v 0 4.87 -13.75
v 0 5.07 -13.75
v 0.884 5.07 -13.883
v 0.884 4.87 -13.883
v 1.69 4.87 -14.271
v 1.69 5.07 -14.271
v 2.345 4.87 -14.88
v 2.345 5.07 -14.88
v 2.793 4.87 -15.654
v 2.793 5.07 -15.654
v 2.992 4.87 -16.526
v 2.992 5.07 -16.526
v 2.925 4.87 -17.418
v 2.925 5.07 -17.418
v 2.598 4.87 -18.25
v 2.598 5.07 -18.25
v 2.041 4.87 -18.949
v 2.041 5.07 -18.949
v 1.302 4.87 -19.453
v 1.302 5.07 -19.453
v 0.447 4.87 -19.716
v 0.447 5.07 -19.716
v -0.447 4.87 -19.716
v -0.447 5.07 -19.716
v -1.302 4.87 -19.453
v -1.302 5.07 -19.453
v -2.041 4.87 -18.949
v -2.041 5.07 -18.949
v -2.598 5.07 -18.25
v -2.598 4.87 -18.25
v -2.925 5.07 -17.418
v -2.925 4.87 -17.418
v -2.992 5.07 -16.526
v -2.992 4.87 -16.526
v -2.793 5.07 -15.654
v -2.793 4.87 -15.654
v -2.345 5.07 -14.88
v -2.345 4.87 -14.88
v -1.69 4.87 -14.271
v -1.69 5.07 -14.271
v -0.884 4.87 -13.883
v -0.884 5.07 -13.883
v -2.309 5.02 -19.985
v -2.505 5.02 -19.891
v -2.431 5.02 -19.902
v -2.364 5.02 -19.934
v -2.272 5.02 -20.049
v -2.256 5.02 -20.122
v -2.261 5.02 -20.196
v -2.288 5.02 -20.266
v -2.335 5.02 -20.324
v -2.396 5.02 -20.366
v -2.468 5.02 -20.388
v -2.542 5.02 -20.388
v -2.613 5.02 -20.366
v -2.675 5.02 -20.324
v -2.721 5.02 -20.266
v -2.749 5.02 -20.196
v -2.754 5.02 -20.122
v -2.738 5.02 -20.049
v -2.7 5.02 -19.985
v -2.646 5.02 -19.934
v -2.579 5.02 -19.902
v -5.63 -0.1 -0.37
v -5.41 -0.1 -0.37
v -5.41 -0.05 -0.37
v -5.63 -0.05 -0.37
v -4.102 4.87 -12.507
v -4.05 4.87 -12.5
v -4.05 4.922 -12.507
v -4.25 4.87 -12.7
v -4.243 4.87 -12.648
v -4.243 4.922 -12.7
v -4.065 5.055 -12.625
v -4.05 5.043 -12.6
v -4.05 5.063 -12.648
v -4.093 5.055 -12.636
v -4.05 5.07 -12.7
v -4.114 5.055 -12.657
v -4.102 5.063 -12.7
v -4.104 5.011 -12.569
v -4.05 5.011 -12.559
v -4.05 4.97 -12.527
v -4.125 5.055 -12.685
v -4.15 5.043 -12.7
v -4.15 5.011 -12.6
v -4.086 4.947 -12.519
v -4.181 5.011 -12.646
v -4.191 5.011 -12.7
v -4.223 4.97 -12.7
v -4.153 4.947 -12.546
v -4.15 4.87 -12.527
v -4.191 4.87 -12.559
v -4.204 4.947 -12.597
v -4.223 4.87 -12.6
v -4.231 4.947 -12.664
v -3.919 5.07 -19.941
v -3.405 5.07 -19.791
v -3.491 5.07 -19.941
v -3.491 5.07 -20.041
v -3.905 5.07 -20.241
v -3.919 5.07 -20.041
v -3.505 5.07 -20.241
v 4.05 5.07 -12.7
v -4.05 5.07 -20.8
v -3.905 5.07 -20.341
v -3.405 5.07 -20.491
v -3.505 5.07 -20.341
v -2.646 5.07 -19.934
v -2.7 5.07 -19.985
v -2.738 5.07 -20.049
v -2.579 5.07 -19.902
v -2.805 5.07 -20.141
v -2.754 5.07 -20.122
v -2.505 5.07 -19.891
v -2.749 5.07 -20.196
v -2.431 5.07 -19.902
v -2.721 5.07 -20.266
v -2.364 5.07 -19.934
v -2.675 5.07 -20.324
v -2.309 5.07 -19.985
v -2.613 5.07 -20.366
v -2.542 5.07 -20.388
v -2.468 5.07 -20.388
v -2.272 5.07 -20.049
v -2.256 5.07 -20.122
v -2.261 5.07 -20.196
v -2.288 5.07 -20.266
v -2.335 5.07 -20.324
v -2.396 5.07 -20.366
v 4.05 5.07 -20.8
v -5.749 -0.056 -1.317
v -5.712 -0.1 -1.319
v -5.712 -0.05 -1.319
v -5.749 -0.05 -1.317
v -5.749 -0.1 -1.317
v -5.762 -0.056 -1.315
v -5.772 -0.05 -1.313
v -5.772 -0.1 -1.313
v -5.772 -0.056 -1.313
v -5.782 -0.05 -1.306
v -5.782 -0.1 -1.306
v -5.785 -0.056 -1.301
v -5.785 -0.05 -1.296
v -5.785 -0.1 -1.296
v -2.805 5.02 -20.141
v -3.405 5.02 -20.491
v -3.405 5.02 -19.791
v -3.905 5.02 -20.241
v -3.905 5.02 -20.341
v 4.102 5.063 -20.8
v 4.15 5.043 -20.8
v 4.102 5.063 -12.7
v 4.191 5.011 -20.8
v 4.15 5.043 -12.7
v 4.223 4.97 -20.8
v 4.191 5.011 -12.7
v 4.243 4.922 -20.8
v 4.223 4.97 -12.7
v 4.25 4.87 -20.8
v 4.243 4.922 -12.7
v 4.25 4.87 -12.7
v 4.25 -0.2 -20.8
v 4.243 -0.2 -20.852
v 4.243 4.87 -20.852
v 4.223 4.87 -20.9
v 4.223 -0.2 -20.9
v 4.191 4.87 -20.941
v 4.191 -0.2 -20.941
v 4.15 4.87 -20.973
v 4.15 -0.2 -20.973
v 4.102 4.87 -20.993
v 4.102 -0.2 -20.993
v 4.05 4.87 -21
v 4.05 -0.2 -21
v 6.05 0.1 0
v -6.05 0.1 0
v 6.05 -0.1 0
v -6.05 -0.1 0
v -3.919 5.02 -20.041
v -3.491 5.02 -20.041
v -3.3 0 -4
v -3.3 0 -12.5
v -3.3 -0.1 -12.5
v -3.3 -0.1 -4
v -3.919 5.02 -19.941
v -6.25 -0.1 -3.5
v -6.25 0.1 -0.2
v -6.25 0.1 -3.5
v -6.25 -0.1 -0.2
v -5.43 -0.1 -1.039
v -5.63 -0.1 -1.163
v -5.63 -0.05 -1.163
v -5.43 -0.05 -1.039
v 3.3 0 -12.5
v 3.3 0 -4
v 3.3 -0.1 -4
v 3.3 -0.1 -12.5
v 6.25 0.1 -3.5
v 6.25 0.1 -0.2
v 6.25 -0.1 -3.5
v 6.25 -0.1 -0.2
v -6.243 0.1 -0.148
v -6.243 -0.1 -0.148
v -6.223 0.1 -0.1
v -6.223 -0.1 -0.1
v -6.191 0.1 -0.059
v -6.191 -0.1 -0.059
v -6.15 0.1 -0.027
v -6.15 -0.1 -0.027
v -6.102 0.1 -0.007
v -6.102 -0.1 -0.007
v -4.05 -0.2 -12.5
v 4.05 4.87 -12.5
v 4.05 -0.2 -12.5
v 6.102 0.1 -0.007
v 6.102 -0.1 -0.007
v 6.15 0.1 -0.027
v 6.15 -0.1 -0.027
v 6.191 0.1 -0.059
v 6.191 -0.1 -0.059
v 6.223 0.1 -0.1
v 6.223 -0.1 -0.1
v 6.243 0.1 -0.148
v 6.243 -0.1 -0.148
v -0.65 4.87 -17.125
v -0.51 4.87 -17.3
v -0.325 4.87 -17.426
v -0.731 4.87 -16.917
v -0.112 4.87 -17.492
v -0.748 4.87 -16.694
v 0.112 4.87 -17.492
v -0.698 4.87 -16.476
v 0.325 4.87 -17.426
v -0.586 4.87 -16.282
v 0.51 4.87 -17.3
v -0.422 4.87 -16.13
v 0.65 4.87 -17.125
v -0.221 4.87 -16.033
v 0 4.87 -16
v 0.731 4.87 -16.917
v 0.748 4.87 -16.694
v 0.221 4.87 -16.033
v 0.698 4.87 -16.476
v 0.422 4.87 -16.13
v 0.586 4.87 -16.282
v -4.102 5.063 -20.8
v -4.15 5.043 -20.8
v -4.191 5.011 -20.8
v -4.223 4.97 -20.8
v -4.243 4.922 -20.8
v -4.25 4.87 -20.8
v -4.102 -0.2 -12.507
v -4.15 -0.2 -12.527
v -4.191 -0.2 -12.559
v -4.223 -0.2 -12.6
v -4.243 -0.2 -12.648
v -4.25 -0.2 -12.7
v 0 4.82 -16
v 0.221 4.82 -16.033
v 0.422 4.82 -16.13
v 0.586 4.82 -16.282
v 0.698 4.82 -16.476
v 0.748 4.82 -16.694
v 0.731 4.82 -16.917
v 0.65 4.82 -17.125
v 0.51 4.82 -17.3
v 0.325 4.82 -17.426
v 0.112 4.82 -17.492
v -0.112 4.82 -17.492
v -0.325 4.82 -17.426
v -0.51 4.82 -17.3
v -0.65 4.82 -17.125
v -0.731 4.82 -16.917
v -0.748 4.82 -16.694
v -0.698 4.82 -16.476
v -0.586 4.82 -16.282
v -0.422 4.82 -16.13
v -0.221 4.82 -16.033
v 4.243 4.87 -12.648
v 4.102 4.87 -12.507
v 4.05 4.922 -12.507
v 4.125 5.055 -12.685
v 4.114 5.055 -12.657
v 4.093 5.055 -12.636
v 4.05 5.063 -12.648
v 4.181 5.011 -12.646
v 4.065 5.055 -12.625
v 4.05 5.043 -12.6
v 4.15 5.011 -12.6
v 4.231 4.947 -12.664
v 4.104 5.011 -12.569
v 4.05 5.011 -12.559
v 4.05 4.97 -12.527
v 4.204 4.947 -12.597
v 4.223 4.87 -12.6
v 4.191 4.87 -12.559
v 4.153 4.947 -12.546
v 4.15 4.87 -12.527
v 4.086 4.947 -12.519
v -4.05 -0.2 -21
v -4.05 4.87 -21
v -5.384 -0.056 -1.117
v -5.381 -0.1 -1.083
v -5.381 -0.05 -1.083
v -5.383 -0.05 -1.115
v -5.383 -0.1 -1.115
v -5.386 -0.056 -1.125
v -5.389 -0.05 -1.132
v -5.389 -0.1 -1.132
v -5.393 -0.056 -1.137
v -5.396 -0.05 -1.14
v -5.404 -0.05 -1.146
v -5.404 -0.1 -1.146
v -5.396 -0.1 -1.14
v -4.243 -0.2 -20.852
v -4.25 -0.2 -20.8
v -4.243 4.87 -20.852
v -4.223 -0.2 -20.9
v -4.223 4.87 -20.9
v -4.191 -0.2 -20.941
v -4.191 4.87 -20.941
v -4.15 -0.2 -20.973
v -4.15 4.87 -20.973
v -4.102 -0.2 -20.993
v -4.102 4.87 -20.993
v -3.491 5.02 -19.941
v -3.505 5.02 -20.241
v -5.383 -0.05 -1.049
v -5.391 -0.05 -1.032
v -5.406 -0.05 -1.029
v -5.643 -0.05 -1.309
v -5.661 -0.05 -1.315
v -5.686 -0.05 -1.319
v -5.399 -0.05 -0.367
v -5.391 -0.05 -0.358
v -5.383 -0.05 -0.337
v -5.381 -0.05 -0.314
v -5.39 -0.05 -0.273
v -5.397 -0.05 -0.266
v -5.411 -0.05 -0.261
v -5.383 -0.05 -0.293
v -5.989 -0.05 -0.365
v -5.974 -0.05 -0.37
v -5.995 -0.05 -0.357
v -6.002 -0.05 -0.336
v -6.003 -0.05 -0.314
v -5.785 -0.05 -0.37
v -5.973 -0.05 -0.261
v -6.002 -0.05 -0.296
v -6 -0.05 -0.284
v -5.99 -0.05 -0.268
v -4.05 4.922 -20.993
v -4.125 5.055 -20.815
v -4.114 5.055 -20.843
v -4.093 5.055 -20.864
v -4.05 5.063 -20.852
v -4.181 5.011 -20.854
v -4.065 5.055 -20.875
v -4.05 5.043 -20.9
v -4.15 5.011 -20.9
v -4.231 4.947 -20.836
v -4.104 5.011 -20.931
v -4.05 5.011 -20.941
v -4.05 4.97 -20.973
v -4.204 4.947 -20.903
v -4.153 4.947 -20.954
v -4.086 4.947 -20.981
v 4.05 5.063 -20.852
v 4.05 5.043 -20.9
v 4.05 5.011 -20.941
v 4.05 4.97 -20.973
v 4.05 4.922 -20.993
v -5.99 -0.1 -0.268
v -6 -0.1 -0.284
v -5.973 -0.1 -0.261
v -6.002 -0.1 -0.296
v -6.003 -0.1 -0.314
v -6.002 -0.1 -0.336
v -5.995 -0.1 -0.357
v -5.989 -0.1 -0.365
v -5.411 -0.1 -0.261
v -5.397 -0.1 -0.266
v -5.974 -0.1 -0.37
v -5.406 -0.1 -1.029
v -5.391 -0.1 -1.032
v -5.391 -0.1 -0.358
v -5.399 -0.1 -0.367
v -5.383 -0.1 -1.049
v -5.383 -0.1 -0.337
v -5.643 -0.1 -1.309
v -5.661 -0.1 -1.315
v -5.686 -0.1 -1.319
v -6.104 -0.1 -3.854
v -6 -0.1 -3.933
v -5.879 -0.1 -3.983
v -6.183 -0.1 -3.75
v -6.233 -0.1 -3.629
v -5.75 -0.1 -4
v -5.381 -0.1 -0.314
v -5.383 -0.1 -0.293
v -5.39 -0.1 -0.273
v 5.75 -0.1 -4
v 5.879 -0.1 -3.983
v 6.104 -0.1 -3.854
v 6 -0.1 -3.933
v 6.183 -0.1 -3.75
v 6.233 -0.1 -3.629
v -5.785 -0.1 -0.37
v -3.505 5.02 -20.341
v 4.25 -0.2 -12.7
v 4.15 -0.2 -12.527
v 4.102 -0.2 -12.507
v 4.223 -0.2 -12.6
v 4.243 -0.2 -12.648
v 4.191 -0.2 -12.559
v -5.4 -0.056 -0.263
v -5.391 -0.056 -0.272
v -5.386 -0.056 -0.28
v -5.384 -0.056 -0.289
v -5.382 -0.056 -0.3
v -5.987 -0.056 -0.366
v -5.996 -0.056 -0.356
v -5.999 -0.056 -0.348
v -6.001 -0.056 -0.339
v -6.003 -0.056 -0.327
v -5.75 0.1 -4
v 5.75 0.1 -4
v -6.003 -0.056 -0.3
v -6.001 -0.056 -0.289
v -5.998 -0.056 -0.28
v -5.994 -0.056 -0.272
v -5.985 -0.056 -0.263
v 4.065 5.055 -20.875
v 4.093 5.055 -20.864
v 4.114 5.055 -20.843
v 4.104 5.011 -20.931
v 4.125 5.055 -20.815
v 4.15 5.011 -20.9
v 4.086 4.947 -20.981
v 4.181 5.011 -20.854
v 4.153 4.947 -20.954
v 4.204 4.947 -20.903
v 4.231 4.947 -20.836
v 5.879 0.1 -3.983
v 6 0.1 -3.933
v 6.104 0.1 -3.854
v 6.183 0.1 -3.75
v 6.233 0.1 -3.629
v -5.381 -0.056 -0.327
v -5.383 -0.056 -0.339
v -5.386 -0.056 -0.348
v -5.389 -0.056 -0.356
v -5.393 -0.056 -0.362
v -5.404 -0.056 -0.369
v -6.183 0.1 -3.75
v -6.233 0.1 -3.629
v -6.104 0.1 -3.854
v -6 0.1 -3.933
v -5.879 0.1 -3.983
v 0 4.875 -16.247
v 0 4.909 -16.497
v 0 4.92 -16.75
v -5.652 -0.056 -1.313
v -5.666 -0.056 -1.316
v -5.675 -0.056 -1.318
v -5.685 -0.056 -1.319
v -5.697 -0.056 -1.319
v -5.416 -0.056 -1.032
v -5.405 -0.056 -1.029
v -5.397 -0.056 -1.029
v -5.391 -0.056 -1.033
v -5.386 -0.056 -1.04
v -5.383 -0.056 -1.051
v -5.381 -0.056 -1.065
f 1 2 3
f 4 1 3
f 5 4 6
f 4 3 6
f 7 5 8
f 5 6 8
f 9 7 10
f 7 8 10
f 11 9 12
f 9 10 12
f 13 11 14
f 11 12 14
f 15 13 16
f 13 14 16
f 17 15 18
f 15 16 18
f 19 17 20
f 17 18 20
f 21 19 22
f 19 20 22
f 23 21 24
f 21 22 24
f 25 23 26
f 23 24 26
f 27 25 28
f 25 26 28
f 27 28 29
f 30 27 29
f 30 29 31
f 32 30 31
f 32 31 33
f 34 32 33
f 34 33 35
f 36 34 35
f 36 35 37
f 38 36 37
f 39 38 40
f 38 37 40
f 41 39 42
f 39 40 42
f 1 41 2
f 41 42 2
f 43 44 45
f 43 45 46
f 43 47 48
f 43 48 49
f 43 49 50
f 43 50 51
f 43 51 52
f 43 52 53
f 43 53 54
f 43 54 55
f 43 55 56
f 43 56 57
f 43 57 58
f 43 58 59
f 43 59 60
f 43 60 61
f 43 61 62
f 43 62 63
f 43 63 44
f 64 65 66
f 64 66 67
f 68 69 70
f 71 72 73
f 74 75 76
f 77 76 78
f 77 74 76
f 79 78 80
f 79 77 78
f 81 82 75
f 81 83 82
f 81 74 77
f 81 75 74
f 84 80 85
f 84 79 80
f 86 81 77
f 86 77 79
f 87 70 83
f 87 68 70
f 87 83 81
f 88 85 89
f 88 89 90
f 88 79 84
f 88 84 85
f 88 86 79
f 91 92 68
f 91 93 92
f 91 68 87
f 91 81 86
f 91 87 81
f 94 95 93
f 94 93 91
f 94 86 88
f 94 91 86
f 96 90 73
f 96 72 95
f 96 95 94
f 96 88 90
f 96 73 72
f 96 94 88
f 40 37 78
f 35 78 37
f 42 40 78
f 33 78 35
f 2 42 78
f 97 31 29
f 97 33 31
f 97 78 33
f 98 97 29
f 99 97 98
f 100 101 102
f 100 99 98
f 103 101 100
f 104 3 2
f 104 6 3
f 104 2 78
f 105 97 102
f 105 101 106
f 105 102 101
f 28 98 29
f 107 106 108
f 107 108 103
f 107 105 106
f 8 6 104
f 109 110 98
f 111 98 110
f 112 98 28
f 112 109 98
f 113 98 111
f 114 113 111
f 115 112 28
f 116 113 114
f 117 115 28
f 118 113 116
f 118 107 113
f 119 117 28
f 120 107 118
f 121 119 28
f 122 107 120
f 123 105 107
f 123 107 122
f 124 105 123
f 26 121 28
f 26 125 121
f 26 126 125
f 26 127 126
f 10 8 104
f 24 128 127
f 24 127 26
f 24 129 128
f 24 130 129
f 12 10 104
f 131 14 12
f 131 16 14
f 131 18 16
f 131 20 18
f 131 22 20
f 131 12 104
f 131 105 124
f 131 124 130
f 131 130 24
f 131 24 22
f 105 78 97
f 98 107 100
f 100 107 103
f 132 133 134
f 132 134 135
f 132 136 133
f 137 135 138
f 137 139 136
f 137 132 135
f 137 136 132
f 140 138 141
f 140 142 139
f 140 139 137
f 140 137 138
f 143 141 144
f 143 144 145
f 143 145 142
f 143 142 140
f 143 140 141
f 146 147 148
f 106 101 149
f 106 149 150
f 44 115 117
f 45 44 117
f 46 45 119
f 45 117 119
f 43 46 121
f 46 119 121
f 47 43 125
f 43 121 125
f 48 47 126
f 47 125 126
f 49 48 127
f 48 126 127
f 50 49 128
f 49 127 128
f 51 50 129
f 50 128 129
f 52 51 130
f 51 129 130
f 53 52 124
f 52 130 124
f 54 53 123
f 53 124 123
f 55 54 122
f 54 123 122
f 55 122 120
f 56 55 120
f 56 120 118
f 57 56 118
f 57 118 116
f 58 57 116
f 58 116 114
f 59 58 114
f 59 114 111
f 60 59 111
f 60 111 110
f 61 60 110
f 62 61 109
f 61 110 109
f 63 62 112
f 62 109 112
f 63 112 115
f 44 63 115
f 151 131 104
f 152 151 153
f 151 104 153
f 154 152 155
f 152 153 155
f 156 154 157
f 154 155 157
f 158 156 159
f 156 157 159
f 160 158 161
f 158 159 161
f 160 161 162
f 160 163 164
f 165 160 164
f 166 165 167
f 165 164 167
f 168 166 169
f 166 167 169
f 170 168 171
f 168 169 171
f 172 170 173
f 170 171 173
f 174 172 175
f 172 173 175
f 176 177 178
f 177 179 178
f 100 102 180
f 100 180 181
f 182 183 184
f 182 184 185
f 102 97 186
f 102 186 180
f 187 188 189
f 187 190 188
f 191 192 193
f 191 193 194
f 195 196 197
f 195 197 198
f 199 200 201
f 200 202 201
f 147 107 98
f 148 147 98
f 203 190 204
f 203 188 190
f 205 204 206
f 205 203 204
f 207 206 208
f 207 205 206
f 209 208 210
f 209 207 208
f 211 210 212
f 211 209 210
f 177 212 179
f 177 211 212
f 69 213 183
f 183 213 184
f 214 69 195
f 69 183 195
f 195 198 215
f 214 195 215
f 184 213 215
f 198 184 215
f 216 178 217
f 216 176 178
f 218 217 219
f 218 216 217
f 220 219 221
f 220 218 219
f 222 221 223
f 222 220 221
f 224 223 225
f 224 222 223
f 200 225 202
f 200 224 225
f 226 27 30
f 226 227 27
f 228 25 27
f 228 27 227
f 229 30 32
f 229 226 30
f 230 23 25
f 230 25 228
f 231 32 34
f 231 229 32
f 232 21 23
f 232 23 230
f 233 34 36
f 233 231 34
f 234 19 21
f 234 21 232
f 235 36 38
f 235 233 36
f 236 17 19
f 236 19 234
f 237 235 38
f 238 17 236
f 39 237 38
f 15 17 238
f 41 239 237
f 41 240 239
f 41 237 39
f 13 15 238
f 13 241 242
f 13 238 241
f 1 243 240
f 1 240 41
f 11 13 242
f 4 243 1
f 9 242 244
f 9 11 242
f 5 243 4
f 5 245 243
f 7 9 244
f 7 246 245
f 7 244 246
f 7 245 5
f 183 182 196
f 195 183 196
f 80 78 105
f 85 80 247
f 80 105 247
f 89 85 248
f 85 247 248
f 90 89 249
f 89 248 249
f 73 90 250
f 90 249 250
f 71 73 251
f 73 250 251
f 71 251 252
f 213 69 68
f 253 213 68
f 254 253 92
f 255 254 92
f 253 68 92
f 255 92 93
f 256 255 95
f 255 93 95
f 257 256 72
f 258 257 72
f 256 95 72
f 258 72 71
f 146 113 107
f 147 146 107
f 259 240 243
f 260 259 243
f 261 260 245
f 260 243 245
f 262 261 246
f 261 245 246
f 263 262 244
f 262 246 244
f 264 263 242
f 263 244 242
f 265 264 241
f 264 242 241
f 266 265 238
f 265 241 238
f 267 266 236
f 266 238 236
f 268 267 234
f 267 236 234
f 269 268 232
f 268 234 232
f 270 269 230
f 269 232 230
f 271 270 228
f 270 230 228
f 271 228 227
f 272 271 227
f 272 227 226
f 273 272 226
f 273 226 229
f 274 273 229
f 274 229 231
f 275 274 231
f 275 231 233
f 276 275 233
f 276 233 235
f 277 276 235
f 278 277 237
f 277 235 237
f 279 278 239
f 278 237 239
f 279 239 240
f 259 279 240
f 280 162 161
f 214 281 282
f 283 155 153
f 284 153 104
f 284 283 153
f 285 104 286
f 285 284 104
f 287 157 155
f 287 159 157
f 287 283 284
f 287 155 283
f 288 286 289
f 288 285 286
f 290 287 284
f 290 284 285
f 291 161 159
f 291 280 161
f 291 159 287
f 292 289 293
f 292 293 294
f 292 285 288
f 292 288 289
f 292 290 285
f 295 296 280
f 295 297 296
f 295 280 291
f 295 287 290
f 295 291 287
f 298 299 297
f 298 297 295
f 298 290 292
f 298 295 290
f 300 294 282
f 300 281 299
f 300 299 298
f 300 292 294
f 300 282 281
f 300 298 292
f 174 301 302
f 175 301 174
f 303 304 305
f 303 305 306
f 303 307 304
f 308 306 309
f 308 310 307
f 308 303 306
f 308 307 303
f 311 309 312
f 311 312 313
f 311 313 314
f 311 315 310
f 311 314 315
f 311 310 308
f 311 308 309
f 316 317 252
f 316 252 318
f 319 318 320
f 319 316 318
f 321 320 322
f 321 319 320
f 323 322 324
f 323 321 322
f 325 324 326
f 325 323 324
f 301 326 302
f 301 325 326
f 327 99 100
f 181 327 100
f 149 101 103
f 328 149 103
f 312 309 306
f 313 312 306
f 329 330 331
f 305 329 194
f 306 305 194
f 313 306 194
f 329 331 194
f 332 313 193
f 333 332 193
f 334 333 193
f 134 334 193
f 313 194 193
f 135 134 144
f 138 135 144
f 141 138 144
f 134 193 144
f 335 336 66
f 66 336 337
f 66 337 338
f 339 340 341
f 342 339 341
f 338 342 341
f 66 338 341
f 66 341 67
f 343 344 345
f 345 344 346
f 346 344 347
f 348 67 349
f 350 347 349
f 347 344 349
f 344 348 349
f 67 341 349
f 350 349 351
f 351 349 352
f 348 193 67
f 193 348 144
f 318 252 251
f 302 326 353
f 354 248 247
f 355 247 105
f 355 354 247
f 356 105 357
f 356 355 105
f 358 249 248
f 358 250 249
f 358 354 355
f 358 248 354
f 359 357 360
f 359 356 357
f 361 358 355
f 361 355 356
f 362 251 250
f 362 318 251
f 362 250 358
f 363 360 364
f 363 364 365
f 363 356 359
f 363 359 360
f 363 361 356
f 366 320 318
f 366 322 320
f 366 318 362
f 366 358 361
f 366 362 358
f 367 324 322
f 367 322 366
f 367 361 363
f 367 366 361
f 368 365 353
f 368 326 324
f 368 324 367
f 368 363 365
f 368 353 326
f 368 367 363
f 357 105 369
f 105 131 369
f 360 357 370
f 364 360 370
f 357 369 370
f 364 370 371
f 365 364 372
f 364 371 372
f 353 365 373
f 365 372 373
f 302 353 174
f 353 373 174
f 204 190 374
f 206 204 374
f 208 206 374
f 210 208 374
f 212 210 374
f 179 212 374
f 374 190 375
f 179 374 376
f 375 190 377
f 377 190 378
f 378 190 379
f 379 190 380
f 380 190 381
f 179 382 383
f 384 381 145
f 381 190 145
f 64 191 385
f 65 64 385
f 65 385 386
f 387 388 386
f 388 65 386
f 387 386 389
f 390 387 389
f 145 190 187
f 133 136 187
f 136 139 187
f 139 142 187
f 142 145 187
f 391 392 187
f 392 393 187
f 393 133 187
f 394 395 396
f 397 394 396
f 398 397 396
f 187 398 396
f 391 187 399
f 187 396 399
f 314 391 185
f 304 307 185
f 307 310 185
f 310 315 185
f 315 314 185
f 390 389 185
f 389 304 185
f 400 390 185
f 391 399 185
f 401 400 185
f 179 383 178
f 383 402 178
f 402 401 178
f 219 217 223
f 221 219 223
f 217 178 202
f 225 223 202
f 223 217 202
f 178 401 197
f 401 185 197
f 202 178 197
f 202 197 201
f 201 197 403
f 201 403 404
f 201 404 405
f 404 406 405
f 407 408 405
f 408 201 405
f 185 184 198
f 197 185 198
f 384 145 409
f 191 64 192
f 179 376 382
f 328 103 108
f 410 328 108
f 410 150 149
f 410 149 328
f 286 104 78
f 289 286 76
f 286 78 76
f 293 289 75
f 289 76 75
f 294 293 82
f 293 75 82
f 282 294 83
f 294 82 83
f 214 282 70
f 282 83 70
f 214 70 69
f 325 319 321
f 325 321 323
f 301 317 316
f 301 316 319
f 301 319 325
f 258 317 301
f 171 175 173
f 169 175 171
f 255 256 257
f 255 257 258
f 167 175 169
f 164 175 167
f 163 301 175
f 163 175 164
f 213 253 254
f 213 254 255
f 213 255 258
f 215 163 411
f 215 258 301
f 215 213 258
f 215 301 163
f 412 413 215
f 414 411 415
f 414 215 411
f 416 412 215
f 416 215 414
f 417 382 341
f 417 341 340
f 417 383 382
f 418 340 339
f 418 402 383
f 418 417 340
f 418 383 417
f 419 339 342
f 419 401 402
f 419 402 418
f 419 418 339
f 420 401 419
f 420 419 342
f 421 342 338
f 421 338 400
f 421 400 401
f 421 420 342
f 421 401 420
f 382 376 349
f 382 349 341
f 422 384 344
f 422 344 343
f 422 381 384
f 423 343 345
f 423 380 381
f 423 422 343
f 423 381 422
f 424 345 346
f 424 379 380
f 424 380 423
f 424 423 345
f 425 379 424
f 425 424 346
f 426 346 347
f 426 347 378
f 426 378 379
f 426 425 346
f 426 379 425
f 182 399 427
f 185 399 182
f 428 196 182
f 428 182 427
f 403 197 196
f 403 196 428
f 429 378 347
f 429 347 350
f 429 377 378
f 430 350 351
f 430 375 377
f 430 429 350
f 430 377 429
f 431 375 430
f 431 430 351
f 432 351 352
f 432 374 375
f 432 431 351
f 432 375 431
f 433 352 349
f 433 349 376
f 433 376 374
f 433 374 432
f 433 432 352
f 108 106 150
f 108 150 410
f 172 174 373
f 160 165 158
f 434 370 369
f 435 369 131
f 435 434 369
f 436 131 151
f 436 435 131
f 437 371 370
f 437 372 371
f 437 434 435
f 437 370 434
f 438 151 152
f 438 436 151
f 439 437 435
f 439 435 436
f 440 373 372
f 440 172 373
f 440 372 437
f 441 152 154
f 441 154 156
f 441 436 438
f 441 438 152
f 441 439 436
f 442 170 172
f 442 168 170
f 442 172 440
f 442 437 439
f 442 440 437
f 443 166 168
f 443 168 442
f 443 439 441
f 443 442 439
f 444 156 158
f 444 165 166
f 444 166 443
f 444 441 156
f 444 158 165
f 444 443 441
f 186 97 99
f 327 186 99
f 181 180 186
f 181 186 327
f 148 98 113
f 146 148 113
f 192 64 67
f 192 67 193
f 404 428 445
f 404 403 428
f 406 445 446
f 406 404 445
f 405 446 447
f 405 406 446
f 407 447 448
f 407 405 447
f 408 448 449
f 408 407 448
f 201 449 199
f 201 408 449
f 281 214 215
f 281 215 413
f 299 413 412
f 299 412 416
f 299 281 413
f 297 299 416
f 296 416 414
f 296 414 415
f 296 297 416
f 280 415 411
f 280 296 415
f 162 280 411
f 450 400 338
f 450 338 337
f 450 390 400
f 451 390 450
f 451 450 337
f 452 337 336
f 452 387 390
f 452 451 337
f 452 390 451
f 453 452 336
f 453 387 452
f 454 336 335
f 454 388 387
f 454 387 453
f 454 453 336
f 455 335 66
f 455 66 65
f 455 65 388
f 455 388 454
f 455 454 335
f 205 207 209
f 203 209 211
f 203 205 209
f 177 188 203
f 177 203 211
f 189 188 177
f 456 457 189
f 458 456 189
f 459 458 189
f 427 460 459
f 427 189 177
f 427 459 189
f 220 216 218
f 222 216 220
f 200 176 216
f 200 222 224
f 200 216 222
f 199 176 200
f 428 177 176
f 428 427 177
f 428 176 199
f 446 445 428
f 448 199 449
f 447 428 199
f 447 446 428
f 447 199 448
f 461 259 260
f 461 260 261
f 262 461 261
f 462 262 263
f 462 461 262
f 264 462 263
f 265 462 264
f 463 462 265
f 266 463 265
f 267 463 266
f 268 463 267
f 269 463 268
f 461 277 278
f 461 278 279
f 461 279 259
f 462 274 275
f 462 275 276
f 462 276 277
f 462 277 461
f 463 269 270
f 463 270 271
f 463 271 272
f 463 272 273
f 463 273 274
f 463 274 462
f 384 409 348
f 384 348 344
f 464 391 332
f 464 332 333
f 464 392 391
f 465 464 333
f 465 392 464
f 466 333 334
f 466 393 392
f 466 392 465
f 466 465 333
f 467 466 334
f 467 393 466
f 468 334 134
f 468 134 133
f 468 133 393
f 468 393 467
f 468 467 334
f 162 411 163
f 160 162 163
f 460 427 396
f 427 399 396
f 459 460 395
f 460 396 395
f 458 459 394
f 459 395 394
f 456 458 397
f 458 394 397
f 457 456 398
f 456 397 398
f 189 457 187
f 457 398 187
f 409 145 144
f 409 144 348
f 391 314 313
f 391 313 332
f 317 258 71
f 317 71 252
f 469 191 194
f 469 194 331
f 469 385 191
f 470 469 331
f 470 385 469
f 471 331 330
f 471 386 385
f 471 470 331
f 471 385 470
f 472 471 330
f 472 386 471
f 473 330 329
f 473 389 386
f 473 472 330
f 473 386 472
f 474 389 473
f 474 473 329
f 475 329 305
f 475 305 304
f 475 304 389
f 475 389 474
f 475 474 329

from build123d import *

# Parameters (mm, degrees)
SM_BASE_FLANGE_1_DEPTH = 0.1
SKETCH_6_W             = 12.5
SKETCH_6_H             = 4
EXTRUDE_1_DEPTH        = 0.1
SKETCH_7_W             = 8.5
SKETCH_7_H             = 8.5
EXTRUDE_2_DEPTH        = 0.1
SKETCH_8_W             = 8.5
SKETCH_8_H             = 8.5
EXTRUDE_3_DEPTH        = 5.07
SKETCH_9_R             = 3
CUT_EXTRUDE_1_DEPTH    = 0.2
FILLET_2_R             = 0.5
FILLET_3_R             = 0.2
SKETCH_11_R            = 0.25
SKETCH_11_W            = 0.4
SKETCH_11_H            = 0.1
SKETCH_11_W_2          = 0.428641975
CUT_EXTRUDE_2_DEPTH    = 0.05
FILLET_4_R             = 0.2
FILLET_5_R             = 0.2
SKETCH_13_R            = 0.75
CUT_EXTRUDE_3_DEPTH    = 0.05
DOME_1_FACE_RADIUS     = 0.75
DOME_1_HEIGHT          = 0.1
CUT_EXTRUDE_4_DEPTH    = 0.05


# Sheet-metal steps are written as plain solids
with BuildPart() as part:
    # Sketch 1 → Базовая кромка1 (new body)
    with BuildSketch(Plane(origin=(0, 0, 0), x_dir=(1, 0, 0), z_dir=(0, 1, 0))):
        Polygon((-6.25, 4), (-6.25, 0), (6.25, 0), (6.25, 4), (3.3, 4), (3.3, 12.5), (4.25, 12.5), (4.25, 21), (-4.25, 21), (-4.25, 12.5), (-3.3, 12.5), (-3.3, 4), align=None)
    extrude(amount=-SM_BASE_FLANGE_1_DEPTH)

    # Эскиз6 → Бобышка-Вытянуть1 (add)
    with BuildSketch(Plane(origin=(0, 0, 0), x_dir=(1, 0, 0), z_dir=(0, 1, 0))):
        with Locations((0, 2)):
            Rectangle(SKETCH_6_W, SKETCH_6_H)
    extrude(amount=EXTRUDE_1_DEPTH)

    # Эскиз7 → Бобышка-Вытянуть2 (add)
    with BuildSketch(Plane.XZ.offset(0.1)):
        with Locations((0, -16.75)):
            Rectangle(SKETCH_7_W, SKETCH_7_H)
    extrude(amount=EXTRUDE_2_DEPTH)

    # Эскиз8 → Бобышка-Вытянуть3 (add)
    with BuildSketch(Plane(origin=(0, 0, 0), x_dir=(1, 0, 0), z_dir=(0, 1, 0))):
        with Locations((0, 16.75)):
            Rectangle(SKETCH_8_W, SKETCH_8_H)
    extrude(amount=EXTRUDE_3_DEPTH)

    # Эскиз9 → Вырез-Вытянуть1 (cut)
    with BuildSketch(Plane(origin=(0, 5.07, 0), x_dir=(1, 0, 0), z_dir=(0, 1, 0))):
        with Locations(Location((0, 16.75, 0), (0, 0, 270))):
            Circle(SKETCH_9_R)
    extrude(amount=-CUT_EXTRUDE_1_DEPTH, mode=Mode.SUBTRACT)

    # Скругление2
    fillet_2_edges = [part.edges().sort_by_distance(p)[0] for p in [
        (6.25, 0, -4),
        (-6.25, 0, -4),
    ]]
    fillet(fillet_2_edges, radius=FILLET_2_R)

    # Скругление3
    fillet_3_edges = [part.edges().sort_by_distance(p)[0] for p in [
        (6.25, 0, 0),
        (-6.25, 0, 0),
    ]]
    fillet(fillet_3_edges, radius=FILLET_3_R)

    # Эскиз11 → Вырез-Вытянуть2 (cut)
    with BuildSketch(Plane(origin=(0, 5.07, 0), x_dir=(1, 0, 0), z_dir=(0, 1, 0))):
        with Locations(Location((-2.504881476, 20.140788589, 0), (0, 0, 270))):
            Circle(SKETCH_11_R)
        Polygon((-3.404881476, 20.490788589), (-3.404881476, 19.790788589), (-2.804881476, 20.140788589), align=None)
        with Locations((-3.704881476, 20.290788589)):
            Rectangle(SKETCH_11_W, SKETCH_11_H)
        with Locations((-3.704881477, 19.990788589)):
            Rectangle(SKETCH_11_W_2, SKETCH_11_H)
    extrude(amount=-CUT_EXTRUDE_2_DEPTH, mode=Mode.SUBTRACT)

    # Скругление4
    fillet_4_edges = [part.edges().sort_by_distance(p)[0] for p in [
        (-4.25, 2.435, -12.5),
        (-4.25, 2.435, -21),
        (4.25, 2.435, -21),
        (4.25, 2.435, -12.5),
    ]]
    fillet(fillet_4_edges, radius=FILLET_4_R)

    # Скругление5
    fillet_5_edges = [part.edges().sort_by_distance(p)[0] for p in [
        (0, 5.07, -21),
        (-4.25, 5.07, -16.75),
        (0, 5.07, -12.5),
        (4.25, 5.07, -16.75),
        (4.191421356, 5.07, -12.558578644),
        (-4.191421356, 5.07, -12.558578644),
        (4.191421356, 5.07, -20.941421356),
        (-4.191421356, 5.07, -20.941421356),
    ]]
    fillet(fillet_5_edges, radius=FILLET_5_R)

    # Эскиз13 → Вырез-Вытянуть3 (cut)
    with BuildSketch(Plane(origin=(0, 4.87, 0), x_dir=(1, 0, 0), z_dir=(0, 1, 0))):
        with Locations(Location((0, 16.75, 0), (0, 0, 270))):
            Circle(SKETCH_13_R)
    extrude(amount=-CUT_EXTRUDE_3_DEPTH, mode=Mode.SUBTRACT)

    # Купол1: a dome of height H over a round flat face of radius A is a cap of a sphere of radius (A * A + H * H) / (2 * H)
    dome_1_r = (DOME_1_FACE_RADIUS * DOME_1_FACE_RADIUS + DOME_1_HEIGHT * DOME_1_HEIGHT) / (2 * DOME_1_HEIGHT)
    dome_1_base = Plane((0, 4.82, -16.75), z_dir=(0, 1, 0))
    with Locations(dome_1_base.offset(DOME_1_HEIGHT - dome_1_r)):
        dome_1_ball = Sphere(dome_1_r, mode=Mode.PRIVATE)
    add(split(dome_1_ball, bisect_by=dome_1_base, keep=Keep.TOP, mode=Mode.PRIVATE))

    # Эскиз14 → Вырез-Вытянуть4 (cut)
    with BuildSketch(Plane.XZ.offset(0.1)):
        with BuildLine():
            add(Edge.make_bspline(
                [(-6.003383397, -0.314306436), (-6.003208457, -0.309686598), (-6.002887878, -0.301220725), (-6.001492735, -0.289495252), (-5.998110788, -0.280222293), (-5.994627409, -0.272683421), (-5.990132541, -0.267041234), (-5.984854454, -0.263323548), (-5.979244173, -0.261024904), (-5.975355275, -0.260713676), (-5.973471862, -0.260562946)],
                knots=[0, 0, 0, 0, 1.628349121, 2.98395659, 4.129704748, 5.086564407, 5.897483759, 6.63370628, 7.338296972, 8, 8, 8, 8], degree=3))
            Line((-5.973471862, -0.260562946), (-5.410745912, -0.260562946))
            add(Edge.make_bspline(
                [(-5.410745912, -0.260562946), (-5.40885651, -0.260694679), (-5.405106012, -0.26095617), (-5.399775012, -0.263392441), (-5.394773829, -0.267176005), (-5.390117693, -0.272704247), (-5.385920232, -0.280035282), (-5.383175234, -0.289598664), (-5.381181748, -0.301173725), (-5.380956895, -0.309674519), (-5.380834377, -0.314306436)],
                knots=[0, 0, 0, 0, 0.664614152, 1.319270975, 2.035609743, 2.868536476, 3.856564754, 4.99840066, 6.364487051, 8, 8, 8, 8], degree=3))
            add(Edge.make_bspline(
                [(-5.380834377, -0.314306436), (-5.380864917, -0.318693721), (-5.380922402, -0.326951838), (-5.382944792, -0.338274401), (-5.385655893, -0.347798587), (-5.388864391, -0.35564771), (-5.393178768, -0.361704746), (-5.397996026, -0.366346051), (-5.403899926, -0.368834535), (-5.407971139, -0.369283488), (-5.410016362, -0.369509025)],
                knots=[0, 0, 0, 0, 1.527993431, 2.876117242, 3.994749226, 4.982414938, 5.814060196, 6.574910721, 7.284088933, 8, 8, 8, 8], degree=3))
            Line((-5.410016362, -0.369509025), (-5.629853985, -0.369509025))
            Line((-5.629853985, -0.369509025), (-5.629853985, -1.163259025))
            Line((-5.629853985, -1.163259025), (-5.429714202, -1.038749221))
            add(Edge.make_bspline(
                [(-5.429714202, -1.038749221), (-5.425149481, -1.036424176), (-5.417333568, -1.032443135), (-5.40641212, -1.02878606), (-5.397209622, -1.028178755), (-5.389825008, -1.032459821), (-5.384765717, -1.040366747), (-5.38236471, -1.05167421), (-5.38104661, -1.066189675), (-5.380910144, -1.077004214), (-5.380834377, -1.083008565)],
                knots=[0, 0, 0, 0, 1.300400407, 2.226601497, 2.927610547, 3.564433773, 4.290758113, 5.250986372, 6.473717283, 8, 8, 8, 8], degree=3))
            add(Edge.make_bspline(
                [(-5.380834377, -1.083008565), (-5.380843974, -1.08746989), (-5.380861627, -1.095675966), (-5.381887136, -1.106960532), (-5.38325169, -1.116425903), (-5.385371952, -1.124314191), (-5.388422962, -1.13096114), (-5.392349709, -1.136754986), (-5.397873467, -1.141735037), (-5.401965467, -1.144813428), (-5.404179965, -1.146479383)],
                knots=[0, 0, 0, 0, 1.503218099, 2.764990822, 3.816270798, 4.724653119, 5.507171343, 6.272807373, 7.065282303, 8, 8, 8, 8], degree=3))
            Line((-5.404179965, -1.146479383), (-5.642985878, -1.308682585))
            add(Edge.make_bspline(
                [(-5.642985878, -1.308682585), (-5.644337471, -1.309545988), (-5.647229049, -1.311393143), (-5.652486271, -1.313205889), (-5.658748264, -1.314930023), (-5.666283445, -1.316627774), (-5.675194902, -1.318142504), (-5.685696762, -1.318759354), (-5.698186972, -1.318943259), (-5.707267063, -1.318913018), (-5.712293093, -1.318896279)],
                knots=[0, 0, 0, 0, 0.541215428, 1.157868723, 1.870271028, 2.742350482, 3.770919716, 4.926365934, 6.298675888, 8, 8, 8, 8], degree=3))
            add(Edge.make_bspline(
                [(-5.712293093, -1.318896279), (-5.719020011, -1.318761234), (-5.731266064, -1.318515389), (-5.747870516, -1.317817694), (-5.761037615, -1.315832622), (-5.771126699, -1.313415241), (-5.77827598, -1.310034132), (-5.783062441, -1.30596597), (-5.784970741, -1.30095795), (-5.785318853, -1.297666831), (-5.78549124, -1.296037058)],
                knots=[0, 0, 0, 0, 1.938222078, 3.528446385, 4.779762996, 5.770770152, 6.501593536, 7.046594974, 7.527870594, 8, 8, 8, 8], degree=3))
            Line((-5.78549124, -1.296037058), (-5.78549124, -0.369509025))
            Line((-5.78549124, -0.369509025), (-5.974444595, -0.369509025))
            add(Edge.make_bspline(
                [(-5.974444595, -0.369509025), (-5.976483759, -0.369264404), (-5.980691588, -0.368759627), (-5.986880194, -0.366432009), (-5.991996556, -0.361778766), (-5.996351899, -0.35568764), (-5.99925034, -0.347770297), (-6.001822213, -0.338280185), (-6.003127762, -0.326904664), (-6.003294537, -0.318685637), (-6.003383397, -0.314306436)],
                knots=[0, 0, 0, 0, 0.711765533, 1.468732524, 2.24630102, 3.073130576, 4.044150543, 5.148818068, 6.480854525, 8, 8, 8, 8], degree=3))
        make_face()
    extrude(amount=-CUT_EXTRUDE_4_DEPTH, mode=Mode.SUBTRACT)


solid = part.part
